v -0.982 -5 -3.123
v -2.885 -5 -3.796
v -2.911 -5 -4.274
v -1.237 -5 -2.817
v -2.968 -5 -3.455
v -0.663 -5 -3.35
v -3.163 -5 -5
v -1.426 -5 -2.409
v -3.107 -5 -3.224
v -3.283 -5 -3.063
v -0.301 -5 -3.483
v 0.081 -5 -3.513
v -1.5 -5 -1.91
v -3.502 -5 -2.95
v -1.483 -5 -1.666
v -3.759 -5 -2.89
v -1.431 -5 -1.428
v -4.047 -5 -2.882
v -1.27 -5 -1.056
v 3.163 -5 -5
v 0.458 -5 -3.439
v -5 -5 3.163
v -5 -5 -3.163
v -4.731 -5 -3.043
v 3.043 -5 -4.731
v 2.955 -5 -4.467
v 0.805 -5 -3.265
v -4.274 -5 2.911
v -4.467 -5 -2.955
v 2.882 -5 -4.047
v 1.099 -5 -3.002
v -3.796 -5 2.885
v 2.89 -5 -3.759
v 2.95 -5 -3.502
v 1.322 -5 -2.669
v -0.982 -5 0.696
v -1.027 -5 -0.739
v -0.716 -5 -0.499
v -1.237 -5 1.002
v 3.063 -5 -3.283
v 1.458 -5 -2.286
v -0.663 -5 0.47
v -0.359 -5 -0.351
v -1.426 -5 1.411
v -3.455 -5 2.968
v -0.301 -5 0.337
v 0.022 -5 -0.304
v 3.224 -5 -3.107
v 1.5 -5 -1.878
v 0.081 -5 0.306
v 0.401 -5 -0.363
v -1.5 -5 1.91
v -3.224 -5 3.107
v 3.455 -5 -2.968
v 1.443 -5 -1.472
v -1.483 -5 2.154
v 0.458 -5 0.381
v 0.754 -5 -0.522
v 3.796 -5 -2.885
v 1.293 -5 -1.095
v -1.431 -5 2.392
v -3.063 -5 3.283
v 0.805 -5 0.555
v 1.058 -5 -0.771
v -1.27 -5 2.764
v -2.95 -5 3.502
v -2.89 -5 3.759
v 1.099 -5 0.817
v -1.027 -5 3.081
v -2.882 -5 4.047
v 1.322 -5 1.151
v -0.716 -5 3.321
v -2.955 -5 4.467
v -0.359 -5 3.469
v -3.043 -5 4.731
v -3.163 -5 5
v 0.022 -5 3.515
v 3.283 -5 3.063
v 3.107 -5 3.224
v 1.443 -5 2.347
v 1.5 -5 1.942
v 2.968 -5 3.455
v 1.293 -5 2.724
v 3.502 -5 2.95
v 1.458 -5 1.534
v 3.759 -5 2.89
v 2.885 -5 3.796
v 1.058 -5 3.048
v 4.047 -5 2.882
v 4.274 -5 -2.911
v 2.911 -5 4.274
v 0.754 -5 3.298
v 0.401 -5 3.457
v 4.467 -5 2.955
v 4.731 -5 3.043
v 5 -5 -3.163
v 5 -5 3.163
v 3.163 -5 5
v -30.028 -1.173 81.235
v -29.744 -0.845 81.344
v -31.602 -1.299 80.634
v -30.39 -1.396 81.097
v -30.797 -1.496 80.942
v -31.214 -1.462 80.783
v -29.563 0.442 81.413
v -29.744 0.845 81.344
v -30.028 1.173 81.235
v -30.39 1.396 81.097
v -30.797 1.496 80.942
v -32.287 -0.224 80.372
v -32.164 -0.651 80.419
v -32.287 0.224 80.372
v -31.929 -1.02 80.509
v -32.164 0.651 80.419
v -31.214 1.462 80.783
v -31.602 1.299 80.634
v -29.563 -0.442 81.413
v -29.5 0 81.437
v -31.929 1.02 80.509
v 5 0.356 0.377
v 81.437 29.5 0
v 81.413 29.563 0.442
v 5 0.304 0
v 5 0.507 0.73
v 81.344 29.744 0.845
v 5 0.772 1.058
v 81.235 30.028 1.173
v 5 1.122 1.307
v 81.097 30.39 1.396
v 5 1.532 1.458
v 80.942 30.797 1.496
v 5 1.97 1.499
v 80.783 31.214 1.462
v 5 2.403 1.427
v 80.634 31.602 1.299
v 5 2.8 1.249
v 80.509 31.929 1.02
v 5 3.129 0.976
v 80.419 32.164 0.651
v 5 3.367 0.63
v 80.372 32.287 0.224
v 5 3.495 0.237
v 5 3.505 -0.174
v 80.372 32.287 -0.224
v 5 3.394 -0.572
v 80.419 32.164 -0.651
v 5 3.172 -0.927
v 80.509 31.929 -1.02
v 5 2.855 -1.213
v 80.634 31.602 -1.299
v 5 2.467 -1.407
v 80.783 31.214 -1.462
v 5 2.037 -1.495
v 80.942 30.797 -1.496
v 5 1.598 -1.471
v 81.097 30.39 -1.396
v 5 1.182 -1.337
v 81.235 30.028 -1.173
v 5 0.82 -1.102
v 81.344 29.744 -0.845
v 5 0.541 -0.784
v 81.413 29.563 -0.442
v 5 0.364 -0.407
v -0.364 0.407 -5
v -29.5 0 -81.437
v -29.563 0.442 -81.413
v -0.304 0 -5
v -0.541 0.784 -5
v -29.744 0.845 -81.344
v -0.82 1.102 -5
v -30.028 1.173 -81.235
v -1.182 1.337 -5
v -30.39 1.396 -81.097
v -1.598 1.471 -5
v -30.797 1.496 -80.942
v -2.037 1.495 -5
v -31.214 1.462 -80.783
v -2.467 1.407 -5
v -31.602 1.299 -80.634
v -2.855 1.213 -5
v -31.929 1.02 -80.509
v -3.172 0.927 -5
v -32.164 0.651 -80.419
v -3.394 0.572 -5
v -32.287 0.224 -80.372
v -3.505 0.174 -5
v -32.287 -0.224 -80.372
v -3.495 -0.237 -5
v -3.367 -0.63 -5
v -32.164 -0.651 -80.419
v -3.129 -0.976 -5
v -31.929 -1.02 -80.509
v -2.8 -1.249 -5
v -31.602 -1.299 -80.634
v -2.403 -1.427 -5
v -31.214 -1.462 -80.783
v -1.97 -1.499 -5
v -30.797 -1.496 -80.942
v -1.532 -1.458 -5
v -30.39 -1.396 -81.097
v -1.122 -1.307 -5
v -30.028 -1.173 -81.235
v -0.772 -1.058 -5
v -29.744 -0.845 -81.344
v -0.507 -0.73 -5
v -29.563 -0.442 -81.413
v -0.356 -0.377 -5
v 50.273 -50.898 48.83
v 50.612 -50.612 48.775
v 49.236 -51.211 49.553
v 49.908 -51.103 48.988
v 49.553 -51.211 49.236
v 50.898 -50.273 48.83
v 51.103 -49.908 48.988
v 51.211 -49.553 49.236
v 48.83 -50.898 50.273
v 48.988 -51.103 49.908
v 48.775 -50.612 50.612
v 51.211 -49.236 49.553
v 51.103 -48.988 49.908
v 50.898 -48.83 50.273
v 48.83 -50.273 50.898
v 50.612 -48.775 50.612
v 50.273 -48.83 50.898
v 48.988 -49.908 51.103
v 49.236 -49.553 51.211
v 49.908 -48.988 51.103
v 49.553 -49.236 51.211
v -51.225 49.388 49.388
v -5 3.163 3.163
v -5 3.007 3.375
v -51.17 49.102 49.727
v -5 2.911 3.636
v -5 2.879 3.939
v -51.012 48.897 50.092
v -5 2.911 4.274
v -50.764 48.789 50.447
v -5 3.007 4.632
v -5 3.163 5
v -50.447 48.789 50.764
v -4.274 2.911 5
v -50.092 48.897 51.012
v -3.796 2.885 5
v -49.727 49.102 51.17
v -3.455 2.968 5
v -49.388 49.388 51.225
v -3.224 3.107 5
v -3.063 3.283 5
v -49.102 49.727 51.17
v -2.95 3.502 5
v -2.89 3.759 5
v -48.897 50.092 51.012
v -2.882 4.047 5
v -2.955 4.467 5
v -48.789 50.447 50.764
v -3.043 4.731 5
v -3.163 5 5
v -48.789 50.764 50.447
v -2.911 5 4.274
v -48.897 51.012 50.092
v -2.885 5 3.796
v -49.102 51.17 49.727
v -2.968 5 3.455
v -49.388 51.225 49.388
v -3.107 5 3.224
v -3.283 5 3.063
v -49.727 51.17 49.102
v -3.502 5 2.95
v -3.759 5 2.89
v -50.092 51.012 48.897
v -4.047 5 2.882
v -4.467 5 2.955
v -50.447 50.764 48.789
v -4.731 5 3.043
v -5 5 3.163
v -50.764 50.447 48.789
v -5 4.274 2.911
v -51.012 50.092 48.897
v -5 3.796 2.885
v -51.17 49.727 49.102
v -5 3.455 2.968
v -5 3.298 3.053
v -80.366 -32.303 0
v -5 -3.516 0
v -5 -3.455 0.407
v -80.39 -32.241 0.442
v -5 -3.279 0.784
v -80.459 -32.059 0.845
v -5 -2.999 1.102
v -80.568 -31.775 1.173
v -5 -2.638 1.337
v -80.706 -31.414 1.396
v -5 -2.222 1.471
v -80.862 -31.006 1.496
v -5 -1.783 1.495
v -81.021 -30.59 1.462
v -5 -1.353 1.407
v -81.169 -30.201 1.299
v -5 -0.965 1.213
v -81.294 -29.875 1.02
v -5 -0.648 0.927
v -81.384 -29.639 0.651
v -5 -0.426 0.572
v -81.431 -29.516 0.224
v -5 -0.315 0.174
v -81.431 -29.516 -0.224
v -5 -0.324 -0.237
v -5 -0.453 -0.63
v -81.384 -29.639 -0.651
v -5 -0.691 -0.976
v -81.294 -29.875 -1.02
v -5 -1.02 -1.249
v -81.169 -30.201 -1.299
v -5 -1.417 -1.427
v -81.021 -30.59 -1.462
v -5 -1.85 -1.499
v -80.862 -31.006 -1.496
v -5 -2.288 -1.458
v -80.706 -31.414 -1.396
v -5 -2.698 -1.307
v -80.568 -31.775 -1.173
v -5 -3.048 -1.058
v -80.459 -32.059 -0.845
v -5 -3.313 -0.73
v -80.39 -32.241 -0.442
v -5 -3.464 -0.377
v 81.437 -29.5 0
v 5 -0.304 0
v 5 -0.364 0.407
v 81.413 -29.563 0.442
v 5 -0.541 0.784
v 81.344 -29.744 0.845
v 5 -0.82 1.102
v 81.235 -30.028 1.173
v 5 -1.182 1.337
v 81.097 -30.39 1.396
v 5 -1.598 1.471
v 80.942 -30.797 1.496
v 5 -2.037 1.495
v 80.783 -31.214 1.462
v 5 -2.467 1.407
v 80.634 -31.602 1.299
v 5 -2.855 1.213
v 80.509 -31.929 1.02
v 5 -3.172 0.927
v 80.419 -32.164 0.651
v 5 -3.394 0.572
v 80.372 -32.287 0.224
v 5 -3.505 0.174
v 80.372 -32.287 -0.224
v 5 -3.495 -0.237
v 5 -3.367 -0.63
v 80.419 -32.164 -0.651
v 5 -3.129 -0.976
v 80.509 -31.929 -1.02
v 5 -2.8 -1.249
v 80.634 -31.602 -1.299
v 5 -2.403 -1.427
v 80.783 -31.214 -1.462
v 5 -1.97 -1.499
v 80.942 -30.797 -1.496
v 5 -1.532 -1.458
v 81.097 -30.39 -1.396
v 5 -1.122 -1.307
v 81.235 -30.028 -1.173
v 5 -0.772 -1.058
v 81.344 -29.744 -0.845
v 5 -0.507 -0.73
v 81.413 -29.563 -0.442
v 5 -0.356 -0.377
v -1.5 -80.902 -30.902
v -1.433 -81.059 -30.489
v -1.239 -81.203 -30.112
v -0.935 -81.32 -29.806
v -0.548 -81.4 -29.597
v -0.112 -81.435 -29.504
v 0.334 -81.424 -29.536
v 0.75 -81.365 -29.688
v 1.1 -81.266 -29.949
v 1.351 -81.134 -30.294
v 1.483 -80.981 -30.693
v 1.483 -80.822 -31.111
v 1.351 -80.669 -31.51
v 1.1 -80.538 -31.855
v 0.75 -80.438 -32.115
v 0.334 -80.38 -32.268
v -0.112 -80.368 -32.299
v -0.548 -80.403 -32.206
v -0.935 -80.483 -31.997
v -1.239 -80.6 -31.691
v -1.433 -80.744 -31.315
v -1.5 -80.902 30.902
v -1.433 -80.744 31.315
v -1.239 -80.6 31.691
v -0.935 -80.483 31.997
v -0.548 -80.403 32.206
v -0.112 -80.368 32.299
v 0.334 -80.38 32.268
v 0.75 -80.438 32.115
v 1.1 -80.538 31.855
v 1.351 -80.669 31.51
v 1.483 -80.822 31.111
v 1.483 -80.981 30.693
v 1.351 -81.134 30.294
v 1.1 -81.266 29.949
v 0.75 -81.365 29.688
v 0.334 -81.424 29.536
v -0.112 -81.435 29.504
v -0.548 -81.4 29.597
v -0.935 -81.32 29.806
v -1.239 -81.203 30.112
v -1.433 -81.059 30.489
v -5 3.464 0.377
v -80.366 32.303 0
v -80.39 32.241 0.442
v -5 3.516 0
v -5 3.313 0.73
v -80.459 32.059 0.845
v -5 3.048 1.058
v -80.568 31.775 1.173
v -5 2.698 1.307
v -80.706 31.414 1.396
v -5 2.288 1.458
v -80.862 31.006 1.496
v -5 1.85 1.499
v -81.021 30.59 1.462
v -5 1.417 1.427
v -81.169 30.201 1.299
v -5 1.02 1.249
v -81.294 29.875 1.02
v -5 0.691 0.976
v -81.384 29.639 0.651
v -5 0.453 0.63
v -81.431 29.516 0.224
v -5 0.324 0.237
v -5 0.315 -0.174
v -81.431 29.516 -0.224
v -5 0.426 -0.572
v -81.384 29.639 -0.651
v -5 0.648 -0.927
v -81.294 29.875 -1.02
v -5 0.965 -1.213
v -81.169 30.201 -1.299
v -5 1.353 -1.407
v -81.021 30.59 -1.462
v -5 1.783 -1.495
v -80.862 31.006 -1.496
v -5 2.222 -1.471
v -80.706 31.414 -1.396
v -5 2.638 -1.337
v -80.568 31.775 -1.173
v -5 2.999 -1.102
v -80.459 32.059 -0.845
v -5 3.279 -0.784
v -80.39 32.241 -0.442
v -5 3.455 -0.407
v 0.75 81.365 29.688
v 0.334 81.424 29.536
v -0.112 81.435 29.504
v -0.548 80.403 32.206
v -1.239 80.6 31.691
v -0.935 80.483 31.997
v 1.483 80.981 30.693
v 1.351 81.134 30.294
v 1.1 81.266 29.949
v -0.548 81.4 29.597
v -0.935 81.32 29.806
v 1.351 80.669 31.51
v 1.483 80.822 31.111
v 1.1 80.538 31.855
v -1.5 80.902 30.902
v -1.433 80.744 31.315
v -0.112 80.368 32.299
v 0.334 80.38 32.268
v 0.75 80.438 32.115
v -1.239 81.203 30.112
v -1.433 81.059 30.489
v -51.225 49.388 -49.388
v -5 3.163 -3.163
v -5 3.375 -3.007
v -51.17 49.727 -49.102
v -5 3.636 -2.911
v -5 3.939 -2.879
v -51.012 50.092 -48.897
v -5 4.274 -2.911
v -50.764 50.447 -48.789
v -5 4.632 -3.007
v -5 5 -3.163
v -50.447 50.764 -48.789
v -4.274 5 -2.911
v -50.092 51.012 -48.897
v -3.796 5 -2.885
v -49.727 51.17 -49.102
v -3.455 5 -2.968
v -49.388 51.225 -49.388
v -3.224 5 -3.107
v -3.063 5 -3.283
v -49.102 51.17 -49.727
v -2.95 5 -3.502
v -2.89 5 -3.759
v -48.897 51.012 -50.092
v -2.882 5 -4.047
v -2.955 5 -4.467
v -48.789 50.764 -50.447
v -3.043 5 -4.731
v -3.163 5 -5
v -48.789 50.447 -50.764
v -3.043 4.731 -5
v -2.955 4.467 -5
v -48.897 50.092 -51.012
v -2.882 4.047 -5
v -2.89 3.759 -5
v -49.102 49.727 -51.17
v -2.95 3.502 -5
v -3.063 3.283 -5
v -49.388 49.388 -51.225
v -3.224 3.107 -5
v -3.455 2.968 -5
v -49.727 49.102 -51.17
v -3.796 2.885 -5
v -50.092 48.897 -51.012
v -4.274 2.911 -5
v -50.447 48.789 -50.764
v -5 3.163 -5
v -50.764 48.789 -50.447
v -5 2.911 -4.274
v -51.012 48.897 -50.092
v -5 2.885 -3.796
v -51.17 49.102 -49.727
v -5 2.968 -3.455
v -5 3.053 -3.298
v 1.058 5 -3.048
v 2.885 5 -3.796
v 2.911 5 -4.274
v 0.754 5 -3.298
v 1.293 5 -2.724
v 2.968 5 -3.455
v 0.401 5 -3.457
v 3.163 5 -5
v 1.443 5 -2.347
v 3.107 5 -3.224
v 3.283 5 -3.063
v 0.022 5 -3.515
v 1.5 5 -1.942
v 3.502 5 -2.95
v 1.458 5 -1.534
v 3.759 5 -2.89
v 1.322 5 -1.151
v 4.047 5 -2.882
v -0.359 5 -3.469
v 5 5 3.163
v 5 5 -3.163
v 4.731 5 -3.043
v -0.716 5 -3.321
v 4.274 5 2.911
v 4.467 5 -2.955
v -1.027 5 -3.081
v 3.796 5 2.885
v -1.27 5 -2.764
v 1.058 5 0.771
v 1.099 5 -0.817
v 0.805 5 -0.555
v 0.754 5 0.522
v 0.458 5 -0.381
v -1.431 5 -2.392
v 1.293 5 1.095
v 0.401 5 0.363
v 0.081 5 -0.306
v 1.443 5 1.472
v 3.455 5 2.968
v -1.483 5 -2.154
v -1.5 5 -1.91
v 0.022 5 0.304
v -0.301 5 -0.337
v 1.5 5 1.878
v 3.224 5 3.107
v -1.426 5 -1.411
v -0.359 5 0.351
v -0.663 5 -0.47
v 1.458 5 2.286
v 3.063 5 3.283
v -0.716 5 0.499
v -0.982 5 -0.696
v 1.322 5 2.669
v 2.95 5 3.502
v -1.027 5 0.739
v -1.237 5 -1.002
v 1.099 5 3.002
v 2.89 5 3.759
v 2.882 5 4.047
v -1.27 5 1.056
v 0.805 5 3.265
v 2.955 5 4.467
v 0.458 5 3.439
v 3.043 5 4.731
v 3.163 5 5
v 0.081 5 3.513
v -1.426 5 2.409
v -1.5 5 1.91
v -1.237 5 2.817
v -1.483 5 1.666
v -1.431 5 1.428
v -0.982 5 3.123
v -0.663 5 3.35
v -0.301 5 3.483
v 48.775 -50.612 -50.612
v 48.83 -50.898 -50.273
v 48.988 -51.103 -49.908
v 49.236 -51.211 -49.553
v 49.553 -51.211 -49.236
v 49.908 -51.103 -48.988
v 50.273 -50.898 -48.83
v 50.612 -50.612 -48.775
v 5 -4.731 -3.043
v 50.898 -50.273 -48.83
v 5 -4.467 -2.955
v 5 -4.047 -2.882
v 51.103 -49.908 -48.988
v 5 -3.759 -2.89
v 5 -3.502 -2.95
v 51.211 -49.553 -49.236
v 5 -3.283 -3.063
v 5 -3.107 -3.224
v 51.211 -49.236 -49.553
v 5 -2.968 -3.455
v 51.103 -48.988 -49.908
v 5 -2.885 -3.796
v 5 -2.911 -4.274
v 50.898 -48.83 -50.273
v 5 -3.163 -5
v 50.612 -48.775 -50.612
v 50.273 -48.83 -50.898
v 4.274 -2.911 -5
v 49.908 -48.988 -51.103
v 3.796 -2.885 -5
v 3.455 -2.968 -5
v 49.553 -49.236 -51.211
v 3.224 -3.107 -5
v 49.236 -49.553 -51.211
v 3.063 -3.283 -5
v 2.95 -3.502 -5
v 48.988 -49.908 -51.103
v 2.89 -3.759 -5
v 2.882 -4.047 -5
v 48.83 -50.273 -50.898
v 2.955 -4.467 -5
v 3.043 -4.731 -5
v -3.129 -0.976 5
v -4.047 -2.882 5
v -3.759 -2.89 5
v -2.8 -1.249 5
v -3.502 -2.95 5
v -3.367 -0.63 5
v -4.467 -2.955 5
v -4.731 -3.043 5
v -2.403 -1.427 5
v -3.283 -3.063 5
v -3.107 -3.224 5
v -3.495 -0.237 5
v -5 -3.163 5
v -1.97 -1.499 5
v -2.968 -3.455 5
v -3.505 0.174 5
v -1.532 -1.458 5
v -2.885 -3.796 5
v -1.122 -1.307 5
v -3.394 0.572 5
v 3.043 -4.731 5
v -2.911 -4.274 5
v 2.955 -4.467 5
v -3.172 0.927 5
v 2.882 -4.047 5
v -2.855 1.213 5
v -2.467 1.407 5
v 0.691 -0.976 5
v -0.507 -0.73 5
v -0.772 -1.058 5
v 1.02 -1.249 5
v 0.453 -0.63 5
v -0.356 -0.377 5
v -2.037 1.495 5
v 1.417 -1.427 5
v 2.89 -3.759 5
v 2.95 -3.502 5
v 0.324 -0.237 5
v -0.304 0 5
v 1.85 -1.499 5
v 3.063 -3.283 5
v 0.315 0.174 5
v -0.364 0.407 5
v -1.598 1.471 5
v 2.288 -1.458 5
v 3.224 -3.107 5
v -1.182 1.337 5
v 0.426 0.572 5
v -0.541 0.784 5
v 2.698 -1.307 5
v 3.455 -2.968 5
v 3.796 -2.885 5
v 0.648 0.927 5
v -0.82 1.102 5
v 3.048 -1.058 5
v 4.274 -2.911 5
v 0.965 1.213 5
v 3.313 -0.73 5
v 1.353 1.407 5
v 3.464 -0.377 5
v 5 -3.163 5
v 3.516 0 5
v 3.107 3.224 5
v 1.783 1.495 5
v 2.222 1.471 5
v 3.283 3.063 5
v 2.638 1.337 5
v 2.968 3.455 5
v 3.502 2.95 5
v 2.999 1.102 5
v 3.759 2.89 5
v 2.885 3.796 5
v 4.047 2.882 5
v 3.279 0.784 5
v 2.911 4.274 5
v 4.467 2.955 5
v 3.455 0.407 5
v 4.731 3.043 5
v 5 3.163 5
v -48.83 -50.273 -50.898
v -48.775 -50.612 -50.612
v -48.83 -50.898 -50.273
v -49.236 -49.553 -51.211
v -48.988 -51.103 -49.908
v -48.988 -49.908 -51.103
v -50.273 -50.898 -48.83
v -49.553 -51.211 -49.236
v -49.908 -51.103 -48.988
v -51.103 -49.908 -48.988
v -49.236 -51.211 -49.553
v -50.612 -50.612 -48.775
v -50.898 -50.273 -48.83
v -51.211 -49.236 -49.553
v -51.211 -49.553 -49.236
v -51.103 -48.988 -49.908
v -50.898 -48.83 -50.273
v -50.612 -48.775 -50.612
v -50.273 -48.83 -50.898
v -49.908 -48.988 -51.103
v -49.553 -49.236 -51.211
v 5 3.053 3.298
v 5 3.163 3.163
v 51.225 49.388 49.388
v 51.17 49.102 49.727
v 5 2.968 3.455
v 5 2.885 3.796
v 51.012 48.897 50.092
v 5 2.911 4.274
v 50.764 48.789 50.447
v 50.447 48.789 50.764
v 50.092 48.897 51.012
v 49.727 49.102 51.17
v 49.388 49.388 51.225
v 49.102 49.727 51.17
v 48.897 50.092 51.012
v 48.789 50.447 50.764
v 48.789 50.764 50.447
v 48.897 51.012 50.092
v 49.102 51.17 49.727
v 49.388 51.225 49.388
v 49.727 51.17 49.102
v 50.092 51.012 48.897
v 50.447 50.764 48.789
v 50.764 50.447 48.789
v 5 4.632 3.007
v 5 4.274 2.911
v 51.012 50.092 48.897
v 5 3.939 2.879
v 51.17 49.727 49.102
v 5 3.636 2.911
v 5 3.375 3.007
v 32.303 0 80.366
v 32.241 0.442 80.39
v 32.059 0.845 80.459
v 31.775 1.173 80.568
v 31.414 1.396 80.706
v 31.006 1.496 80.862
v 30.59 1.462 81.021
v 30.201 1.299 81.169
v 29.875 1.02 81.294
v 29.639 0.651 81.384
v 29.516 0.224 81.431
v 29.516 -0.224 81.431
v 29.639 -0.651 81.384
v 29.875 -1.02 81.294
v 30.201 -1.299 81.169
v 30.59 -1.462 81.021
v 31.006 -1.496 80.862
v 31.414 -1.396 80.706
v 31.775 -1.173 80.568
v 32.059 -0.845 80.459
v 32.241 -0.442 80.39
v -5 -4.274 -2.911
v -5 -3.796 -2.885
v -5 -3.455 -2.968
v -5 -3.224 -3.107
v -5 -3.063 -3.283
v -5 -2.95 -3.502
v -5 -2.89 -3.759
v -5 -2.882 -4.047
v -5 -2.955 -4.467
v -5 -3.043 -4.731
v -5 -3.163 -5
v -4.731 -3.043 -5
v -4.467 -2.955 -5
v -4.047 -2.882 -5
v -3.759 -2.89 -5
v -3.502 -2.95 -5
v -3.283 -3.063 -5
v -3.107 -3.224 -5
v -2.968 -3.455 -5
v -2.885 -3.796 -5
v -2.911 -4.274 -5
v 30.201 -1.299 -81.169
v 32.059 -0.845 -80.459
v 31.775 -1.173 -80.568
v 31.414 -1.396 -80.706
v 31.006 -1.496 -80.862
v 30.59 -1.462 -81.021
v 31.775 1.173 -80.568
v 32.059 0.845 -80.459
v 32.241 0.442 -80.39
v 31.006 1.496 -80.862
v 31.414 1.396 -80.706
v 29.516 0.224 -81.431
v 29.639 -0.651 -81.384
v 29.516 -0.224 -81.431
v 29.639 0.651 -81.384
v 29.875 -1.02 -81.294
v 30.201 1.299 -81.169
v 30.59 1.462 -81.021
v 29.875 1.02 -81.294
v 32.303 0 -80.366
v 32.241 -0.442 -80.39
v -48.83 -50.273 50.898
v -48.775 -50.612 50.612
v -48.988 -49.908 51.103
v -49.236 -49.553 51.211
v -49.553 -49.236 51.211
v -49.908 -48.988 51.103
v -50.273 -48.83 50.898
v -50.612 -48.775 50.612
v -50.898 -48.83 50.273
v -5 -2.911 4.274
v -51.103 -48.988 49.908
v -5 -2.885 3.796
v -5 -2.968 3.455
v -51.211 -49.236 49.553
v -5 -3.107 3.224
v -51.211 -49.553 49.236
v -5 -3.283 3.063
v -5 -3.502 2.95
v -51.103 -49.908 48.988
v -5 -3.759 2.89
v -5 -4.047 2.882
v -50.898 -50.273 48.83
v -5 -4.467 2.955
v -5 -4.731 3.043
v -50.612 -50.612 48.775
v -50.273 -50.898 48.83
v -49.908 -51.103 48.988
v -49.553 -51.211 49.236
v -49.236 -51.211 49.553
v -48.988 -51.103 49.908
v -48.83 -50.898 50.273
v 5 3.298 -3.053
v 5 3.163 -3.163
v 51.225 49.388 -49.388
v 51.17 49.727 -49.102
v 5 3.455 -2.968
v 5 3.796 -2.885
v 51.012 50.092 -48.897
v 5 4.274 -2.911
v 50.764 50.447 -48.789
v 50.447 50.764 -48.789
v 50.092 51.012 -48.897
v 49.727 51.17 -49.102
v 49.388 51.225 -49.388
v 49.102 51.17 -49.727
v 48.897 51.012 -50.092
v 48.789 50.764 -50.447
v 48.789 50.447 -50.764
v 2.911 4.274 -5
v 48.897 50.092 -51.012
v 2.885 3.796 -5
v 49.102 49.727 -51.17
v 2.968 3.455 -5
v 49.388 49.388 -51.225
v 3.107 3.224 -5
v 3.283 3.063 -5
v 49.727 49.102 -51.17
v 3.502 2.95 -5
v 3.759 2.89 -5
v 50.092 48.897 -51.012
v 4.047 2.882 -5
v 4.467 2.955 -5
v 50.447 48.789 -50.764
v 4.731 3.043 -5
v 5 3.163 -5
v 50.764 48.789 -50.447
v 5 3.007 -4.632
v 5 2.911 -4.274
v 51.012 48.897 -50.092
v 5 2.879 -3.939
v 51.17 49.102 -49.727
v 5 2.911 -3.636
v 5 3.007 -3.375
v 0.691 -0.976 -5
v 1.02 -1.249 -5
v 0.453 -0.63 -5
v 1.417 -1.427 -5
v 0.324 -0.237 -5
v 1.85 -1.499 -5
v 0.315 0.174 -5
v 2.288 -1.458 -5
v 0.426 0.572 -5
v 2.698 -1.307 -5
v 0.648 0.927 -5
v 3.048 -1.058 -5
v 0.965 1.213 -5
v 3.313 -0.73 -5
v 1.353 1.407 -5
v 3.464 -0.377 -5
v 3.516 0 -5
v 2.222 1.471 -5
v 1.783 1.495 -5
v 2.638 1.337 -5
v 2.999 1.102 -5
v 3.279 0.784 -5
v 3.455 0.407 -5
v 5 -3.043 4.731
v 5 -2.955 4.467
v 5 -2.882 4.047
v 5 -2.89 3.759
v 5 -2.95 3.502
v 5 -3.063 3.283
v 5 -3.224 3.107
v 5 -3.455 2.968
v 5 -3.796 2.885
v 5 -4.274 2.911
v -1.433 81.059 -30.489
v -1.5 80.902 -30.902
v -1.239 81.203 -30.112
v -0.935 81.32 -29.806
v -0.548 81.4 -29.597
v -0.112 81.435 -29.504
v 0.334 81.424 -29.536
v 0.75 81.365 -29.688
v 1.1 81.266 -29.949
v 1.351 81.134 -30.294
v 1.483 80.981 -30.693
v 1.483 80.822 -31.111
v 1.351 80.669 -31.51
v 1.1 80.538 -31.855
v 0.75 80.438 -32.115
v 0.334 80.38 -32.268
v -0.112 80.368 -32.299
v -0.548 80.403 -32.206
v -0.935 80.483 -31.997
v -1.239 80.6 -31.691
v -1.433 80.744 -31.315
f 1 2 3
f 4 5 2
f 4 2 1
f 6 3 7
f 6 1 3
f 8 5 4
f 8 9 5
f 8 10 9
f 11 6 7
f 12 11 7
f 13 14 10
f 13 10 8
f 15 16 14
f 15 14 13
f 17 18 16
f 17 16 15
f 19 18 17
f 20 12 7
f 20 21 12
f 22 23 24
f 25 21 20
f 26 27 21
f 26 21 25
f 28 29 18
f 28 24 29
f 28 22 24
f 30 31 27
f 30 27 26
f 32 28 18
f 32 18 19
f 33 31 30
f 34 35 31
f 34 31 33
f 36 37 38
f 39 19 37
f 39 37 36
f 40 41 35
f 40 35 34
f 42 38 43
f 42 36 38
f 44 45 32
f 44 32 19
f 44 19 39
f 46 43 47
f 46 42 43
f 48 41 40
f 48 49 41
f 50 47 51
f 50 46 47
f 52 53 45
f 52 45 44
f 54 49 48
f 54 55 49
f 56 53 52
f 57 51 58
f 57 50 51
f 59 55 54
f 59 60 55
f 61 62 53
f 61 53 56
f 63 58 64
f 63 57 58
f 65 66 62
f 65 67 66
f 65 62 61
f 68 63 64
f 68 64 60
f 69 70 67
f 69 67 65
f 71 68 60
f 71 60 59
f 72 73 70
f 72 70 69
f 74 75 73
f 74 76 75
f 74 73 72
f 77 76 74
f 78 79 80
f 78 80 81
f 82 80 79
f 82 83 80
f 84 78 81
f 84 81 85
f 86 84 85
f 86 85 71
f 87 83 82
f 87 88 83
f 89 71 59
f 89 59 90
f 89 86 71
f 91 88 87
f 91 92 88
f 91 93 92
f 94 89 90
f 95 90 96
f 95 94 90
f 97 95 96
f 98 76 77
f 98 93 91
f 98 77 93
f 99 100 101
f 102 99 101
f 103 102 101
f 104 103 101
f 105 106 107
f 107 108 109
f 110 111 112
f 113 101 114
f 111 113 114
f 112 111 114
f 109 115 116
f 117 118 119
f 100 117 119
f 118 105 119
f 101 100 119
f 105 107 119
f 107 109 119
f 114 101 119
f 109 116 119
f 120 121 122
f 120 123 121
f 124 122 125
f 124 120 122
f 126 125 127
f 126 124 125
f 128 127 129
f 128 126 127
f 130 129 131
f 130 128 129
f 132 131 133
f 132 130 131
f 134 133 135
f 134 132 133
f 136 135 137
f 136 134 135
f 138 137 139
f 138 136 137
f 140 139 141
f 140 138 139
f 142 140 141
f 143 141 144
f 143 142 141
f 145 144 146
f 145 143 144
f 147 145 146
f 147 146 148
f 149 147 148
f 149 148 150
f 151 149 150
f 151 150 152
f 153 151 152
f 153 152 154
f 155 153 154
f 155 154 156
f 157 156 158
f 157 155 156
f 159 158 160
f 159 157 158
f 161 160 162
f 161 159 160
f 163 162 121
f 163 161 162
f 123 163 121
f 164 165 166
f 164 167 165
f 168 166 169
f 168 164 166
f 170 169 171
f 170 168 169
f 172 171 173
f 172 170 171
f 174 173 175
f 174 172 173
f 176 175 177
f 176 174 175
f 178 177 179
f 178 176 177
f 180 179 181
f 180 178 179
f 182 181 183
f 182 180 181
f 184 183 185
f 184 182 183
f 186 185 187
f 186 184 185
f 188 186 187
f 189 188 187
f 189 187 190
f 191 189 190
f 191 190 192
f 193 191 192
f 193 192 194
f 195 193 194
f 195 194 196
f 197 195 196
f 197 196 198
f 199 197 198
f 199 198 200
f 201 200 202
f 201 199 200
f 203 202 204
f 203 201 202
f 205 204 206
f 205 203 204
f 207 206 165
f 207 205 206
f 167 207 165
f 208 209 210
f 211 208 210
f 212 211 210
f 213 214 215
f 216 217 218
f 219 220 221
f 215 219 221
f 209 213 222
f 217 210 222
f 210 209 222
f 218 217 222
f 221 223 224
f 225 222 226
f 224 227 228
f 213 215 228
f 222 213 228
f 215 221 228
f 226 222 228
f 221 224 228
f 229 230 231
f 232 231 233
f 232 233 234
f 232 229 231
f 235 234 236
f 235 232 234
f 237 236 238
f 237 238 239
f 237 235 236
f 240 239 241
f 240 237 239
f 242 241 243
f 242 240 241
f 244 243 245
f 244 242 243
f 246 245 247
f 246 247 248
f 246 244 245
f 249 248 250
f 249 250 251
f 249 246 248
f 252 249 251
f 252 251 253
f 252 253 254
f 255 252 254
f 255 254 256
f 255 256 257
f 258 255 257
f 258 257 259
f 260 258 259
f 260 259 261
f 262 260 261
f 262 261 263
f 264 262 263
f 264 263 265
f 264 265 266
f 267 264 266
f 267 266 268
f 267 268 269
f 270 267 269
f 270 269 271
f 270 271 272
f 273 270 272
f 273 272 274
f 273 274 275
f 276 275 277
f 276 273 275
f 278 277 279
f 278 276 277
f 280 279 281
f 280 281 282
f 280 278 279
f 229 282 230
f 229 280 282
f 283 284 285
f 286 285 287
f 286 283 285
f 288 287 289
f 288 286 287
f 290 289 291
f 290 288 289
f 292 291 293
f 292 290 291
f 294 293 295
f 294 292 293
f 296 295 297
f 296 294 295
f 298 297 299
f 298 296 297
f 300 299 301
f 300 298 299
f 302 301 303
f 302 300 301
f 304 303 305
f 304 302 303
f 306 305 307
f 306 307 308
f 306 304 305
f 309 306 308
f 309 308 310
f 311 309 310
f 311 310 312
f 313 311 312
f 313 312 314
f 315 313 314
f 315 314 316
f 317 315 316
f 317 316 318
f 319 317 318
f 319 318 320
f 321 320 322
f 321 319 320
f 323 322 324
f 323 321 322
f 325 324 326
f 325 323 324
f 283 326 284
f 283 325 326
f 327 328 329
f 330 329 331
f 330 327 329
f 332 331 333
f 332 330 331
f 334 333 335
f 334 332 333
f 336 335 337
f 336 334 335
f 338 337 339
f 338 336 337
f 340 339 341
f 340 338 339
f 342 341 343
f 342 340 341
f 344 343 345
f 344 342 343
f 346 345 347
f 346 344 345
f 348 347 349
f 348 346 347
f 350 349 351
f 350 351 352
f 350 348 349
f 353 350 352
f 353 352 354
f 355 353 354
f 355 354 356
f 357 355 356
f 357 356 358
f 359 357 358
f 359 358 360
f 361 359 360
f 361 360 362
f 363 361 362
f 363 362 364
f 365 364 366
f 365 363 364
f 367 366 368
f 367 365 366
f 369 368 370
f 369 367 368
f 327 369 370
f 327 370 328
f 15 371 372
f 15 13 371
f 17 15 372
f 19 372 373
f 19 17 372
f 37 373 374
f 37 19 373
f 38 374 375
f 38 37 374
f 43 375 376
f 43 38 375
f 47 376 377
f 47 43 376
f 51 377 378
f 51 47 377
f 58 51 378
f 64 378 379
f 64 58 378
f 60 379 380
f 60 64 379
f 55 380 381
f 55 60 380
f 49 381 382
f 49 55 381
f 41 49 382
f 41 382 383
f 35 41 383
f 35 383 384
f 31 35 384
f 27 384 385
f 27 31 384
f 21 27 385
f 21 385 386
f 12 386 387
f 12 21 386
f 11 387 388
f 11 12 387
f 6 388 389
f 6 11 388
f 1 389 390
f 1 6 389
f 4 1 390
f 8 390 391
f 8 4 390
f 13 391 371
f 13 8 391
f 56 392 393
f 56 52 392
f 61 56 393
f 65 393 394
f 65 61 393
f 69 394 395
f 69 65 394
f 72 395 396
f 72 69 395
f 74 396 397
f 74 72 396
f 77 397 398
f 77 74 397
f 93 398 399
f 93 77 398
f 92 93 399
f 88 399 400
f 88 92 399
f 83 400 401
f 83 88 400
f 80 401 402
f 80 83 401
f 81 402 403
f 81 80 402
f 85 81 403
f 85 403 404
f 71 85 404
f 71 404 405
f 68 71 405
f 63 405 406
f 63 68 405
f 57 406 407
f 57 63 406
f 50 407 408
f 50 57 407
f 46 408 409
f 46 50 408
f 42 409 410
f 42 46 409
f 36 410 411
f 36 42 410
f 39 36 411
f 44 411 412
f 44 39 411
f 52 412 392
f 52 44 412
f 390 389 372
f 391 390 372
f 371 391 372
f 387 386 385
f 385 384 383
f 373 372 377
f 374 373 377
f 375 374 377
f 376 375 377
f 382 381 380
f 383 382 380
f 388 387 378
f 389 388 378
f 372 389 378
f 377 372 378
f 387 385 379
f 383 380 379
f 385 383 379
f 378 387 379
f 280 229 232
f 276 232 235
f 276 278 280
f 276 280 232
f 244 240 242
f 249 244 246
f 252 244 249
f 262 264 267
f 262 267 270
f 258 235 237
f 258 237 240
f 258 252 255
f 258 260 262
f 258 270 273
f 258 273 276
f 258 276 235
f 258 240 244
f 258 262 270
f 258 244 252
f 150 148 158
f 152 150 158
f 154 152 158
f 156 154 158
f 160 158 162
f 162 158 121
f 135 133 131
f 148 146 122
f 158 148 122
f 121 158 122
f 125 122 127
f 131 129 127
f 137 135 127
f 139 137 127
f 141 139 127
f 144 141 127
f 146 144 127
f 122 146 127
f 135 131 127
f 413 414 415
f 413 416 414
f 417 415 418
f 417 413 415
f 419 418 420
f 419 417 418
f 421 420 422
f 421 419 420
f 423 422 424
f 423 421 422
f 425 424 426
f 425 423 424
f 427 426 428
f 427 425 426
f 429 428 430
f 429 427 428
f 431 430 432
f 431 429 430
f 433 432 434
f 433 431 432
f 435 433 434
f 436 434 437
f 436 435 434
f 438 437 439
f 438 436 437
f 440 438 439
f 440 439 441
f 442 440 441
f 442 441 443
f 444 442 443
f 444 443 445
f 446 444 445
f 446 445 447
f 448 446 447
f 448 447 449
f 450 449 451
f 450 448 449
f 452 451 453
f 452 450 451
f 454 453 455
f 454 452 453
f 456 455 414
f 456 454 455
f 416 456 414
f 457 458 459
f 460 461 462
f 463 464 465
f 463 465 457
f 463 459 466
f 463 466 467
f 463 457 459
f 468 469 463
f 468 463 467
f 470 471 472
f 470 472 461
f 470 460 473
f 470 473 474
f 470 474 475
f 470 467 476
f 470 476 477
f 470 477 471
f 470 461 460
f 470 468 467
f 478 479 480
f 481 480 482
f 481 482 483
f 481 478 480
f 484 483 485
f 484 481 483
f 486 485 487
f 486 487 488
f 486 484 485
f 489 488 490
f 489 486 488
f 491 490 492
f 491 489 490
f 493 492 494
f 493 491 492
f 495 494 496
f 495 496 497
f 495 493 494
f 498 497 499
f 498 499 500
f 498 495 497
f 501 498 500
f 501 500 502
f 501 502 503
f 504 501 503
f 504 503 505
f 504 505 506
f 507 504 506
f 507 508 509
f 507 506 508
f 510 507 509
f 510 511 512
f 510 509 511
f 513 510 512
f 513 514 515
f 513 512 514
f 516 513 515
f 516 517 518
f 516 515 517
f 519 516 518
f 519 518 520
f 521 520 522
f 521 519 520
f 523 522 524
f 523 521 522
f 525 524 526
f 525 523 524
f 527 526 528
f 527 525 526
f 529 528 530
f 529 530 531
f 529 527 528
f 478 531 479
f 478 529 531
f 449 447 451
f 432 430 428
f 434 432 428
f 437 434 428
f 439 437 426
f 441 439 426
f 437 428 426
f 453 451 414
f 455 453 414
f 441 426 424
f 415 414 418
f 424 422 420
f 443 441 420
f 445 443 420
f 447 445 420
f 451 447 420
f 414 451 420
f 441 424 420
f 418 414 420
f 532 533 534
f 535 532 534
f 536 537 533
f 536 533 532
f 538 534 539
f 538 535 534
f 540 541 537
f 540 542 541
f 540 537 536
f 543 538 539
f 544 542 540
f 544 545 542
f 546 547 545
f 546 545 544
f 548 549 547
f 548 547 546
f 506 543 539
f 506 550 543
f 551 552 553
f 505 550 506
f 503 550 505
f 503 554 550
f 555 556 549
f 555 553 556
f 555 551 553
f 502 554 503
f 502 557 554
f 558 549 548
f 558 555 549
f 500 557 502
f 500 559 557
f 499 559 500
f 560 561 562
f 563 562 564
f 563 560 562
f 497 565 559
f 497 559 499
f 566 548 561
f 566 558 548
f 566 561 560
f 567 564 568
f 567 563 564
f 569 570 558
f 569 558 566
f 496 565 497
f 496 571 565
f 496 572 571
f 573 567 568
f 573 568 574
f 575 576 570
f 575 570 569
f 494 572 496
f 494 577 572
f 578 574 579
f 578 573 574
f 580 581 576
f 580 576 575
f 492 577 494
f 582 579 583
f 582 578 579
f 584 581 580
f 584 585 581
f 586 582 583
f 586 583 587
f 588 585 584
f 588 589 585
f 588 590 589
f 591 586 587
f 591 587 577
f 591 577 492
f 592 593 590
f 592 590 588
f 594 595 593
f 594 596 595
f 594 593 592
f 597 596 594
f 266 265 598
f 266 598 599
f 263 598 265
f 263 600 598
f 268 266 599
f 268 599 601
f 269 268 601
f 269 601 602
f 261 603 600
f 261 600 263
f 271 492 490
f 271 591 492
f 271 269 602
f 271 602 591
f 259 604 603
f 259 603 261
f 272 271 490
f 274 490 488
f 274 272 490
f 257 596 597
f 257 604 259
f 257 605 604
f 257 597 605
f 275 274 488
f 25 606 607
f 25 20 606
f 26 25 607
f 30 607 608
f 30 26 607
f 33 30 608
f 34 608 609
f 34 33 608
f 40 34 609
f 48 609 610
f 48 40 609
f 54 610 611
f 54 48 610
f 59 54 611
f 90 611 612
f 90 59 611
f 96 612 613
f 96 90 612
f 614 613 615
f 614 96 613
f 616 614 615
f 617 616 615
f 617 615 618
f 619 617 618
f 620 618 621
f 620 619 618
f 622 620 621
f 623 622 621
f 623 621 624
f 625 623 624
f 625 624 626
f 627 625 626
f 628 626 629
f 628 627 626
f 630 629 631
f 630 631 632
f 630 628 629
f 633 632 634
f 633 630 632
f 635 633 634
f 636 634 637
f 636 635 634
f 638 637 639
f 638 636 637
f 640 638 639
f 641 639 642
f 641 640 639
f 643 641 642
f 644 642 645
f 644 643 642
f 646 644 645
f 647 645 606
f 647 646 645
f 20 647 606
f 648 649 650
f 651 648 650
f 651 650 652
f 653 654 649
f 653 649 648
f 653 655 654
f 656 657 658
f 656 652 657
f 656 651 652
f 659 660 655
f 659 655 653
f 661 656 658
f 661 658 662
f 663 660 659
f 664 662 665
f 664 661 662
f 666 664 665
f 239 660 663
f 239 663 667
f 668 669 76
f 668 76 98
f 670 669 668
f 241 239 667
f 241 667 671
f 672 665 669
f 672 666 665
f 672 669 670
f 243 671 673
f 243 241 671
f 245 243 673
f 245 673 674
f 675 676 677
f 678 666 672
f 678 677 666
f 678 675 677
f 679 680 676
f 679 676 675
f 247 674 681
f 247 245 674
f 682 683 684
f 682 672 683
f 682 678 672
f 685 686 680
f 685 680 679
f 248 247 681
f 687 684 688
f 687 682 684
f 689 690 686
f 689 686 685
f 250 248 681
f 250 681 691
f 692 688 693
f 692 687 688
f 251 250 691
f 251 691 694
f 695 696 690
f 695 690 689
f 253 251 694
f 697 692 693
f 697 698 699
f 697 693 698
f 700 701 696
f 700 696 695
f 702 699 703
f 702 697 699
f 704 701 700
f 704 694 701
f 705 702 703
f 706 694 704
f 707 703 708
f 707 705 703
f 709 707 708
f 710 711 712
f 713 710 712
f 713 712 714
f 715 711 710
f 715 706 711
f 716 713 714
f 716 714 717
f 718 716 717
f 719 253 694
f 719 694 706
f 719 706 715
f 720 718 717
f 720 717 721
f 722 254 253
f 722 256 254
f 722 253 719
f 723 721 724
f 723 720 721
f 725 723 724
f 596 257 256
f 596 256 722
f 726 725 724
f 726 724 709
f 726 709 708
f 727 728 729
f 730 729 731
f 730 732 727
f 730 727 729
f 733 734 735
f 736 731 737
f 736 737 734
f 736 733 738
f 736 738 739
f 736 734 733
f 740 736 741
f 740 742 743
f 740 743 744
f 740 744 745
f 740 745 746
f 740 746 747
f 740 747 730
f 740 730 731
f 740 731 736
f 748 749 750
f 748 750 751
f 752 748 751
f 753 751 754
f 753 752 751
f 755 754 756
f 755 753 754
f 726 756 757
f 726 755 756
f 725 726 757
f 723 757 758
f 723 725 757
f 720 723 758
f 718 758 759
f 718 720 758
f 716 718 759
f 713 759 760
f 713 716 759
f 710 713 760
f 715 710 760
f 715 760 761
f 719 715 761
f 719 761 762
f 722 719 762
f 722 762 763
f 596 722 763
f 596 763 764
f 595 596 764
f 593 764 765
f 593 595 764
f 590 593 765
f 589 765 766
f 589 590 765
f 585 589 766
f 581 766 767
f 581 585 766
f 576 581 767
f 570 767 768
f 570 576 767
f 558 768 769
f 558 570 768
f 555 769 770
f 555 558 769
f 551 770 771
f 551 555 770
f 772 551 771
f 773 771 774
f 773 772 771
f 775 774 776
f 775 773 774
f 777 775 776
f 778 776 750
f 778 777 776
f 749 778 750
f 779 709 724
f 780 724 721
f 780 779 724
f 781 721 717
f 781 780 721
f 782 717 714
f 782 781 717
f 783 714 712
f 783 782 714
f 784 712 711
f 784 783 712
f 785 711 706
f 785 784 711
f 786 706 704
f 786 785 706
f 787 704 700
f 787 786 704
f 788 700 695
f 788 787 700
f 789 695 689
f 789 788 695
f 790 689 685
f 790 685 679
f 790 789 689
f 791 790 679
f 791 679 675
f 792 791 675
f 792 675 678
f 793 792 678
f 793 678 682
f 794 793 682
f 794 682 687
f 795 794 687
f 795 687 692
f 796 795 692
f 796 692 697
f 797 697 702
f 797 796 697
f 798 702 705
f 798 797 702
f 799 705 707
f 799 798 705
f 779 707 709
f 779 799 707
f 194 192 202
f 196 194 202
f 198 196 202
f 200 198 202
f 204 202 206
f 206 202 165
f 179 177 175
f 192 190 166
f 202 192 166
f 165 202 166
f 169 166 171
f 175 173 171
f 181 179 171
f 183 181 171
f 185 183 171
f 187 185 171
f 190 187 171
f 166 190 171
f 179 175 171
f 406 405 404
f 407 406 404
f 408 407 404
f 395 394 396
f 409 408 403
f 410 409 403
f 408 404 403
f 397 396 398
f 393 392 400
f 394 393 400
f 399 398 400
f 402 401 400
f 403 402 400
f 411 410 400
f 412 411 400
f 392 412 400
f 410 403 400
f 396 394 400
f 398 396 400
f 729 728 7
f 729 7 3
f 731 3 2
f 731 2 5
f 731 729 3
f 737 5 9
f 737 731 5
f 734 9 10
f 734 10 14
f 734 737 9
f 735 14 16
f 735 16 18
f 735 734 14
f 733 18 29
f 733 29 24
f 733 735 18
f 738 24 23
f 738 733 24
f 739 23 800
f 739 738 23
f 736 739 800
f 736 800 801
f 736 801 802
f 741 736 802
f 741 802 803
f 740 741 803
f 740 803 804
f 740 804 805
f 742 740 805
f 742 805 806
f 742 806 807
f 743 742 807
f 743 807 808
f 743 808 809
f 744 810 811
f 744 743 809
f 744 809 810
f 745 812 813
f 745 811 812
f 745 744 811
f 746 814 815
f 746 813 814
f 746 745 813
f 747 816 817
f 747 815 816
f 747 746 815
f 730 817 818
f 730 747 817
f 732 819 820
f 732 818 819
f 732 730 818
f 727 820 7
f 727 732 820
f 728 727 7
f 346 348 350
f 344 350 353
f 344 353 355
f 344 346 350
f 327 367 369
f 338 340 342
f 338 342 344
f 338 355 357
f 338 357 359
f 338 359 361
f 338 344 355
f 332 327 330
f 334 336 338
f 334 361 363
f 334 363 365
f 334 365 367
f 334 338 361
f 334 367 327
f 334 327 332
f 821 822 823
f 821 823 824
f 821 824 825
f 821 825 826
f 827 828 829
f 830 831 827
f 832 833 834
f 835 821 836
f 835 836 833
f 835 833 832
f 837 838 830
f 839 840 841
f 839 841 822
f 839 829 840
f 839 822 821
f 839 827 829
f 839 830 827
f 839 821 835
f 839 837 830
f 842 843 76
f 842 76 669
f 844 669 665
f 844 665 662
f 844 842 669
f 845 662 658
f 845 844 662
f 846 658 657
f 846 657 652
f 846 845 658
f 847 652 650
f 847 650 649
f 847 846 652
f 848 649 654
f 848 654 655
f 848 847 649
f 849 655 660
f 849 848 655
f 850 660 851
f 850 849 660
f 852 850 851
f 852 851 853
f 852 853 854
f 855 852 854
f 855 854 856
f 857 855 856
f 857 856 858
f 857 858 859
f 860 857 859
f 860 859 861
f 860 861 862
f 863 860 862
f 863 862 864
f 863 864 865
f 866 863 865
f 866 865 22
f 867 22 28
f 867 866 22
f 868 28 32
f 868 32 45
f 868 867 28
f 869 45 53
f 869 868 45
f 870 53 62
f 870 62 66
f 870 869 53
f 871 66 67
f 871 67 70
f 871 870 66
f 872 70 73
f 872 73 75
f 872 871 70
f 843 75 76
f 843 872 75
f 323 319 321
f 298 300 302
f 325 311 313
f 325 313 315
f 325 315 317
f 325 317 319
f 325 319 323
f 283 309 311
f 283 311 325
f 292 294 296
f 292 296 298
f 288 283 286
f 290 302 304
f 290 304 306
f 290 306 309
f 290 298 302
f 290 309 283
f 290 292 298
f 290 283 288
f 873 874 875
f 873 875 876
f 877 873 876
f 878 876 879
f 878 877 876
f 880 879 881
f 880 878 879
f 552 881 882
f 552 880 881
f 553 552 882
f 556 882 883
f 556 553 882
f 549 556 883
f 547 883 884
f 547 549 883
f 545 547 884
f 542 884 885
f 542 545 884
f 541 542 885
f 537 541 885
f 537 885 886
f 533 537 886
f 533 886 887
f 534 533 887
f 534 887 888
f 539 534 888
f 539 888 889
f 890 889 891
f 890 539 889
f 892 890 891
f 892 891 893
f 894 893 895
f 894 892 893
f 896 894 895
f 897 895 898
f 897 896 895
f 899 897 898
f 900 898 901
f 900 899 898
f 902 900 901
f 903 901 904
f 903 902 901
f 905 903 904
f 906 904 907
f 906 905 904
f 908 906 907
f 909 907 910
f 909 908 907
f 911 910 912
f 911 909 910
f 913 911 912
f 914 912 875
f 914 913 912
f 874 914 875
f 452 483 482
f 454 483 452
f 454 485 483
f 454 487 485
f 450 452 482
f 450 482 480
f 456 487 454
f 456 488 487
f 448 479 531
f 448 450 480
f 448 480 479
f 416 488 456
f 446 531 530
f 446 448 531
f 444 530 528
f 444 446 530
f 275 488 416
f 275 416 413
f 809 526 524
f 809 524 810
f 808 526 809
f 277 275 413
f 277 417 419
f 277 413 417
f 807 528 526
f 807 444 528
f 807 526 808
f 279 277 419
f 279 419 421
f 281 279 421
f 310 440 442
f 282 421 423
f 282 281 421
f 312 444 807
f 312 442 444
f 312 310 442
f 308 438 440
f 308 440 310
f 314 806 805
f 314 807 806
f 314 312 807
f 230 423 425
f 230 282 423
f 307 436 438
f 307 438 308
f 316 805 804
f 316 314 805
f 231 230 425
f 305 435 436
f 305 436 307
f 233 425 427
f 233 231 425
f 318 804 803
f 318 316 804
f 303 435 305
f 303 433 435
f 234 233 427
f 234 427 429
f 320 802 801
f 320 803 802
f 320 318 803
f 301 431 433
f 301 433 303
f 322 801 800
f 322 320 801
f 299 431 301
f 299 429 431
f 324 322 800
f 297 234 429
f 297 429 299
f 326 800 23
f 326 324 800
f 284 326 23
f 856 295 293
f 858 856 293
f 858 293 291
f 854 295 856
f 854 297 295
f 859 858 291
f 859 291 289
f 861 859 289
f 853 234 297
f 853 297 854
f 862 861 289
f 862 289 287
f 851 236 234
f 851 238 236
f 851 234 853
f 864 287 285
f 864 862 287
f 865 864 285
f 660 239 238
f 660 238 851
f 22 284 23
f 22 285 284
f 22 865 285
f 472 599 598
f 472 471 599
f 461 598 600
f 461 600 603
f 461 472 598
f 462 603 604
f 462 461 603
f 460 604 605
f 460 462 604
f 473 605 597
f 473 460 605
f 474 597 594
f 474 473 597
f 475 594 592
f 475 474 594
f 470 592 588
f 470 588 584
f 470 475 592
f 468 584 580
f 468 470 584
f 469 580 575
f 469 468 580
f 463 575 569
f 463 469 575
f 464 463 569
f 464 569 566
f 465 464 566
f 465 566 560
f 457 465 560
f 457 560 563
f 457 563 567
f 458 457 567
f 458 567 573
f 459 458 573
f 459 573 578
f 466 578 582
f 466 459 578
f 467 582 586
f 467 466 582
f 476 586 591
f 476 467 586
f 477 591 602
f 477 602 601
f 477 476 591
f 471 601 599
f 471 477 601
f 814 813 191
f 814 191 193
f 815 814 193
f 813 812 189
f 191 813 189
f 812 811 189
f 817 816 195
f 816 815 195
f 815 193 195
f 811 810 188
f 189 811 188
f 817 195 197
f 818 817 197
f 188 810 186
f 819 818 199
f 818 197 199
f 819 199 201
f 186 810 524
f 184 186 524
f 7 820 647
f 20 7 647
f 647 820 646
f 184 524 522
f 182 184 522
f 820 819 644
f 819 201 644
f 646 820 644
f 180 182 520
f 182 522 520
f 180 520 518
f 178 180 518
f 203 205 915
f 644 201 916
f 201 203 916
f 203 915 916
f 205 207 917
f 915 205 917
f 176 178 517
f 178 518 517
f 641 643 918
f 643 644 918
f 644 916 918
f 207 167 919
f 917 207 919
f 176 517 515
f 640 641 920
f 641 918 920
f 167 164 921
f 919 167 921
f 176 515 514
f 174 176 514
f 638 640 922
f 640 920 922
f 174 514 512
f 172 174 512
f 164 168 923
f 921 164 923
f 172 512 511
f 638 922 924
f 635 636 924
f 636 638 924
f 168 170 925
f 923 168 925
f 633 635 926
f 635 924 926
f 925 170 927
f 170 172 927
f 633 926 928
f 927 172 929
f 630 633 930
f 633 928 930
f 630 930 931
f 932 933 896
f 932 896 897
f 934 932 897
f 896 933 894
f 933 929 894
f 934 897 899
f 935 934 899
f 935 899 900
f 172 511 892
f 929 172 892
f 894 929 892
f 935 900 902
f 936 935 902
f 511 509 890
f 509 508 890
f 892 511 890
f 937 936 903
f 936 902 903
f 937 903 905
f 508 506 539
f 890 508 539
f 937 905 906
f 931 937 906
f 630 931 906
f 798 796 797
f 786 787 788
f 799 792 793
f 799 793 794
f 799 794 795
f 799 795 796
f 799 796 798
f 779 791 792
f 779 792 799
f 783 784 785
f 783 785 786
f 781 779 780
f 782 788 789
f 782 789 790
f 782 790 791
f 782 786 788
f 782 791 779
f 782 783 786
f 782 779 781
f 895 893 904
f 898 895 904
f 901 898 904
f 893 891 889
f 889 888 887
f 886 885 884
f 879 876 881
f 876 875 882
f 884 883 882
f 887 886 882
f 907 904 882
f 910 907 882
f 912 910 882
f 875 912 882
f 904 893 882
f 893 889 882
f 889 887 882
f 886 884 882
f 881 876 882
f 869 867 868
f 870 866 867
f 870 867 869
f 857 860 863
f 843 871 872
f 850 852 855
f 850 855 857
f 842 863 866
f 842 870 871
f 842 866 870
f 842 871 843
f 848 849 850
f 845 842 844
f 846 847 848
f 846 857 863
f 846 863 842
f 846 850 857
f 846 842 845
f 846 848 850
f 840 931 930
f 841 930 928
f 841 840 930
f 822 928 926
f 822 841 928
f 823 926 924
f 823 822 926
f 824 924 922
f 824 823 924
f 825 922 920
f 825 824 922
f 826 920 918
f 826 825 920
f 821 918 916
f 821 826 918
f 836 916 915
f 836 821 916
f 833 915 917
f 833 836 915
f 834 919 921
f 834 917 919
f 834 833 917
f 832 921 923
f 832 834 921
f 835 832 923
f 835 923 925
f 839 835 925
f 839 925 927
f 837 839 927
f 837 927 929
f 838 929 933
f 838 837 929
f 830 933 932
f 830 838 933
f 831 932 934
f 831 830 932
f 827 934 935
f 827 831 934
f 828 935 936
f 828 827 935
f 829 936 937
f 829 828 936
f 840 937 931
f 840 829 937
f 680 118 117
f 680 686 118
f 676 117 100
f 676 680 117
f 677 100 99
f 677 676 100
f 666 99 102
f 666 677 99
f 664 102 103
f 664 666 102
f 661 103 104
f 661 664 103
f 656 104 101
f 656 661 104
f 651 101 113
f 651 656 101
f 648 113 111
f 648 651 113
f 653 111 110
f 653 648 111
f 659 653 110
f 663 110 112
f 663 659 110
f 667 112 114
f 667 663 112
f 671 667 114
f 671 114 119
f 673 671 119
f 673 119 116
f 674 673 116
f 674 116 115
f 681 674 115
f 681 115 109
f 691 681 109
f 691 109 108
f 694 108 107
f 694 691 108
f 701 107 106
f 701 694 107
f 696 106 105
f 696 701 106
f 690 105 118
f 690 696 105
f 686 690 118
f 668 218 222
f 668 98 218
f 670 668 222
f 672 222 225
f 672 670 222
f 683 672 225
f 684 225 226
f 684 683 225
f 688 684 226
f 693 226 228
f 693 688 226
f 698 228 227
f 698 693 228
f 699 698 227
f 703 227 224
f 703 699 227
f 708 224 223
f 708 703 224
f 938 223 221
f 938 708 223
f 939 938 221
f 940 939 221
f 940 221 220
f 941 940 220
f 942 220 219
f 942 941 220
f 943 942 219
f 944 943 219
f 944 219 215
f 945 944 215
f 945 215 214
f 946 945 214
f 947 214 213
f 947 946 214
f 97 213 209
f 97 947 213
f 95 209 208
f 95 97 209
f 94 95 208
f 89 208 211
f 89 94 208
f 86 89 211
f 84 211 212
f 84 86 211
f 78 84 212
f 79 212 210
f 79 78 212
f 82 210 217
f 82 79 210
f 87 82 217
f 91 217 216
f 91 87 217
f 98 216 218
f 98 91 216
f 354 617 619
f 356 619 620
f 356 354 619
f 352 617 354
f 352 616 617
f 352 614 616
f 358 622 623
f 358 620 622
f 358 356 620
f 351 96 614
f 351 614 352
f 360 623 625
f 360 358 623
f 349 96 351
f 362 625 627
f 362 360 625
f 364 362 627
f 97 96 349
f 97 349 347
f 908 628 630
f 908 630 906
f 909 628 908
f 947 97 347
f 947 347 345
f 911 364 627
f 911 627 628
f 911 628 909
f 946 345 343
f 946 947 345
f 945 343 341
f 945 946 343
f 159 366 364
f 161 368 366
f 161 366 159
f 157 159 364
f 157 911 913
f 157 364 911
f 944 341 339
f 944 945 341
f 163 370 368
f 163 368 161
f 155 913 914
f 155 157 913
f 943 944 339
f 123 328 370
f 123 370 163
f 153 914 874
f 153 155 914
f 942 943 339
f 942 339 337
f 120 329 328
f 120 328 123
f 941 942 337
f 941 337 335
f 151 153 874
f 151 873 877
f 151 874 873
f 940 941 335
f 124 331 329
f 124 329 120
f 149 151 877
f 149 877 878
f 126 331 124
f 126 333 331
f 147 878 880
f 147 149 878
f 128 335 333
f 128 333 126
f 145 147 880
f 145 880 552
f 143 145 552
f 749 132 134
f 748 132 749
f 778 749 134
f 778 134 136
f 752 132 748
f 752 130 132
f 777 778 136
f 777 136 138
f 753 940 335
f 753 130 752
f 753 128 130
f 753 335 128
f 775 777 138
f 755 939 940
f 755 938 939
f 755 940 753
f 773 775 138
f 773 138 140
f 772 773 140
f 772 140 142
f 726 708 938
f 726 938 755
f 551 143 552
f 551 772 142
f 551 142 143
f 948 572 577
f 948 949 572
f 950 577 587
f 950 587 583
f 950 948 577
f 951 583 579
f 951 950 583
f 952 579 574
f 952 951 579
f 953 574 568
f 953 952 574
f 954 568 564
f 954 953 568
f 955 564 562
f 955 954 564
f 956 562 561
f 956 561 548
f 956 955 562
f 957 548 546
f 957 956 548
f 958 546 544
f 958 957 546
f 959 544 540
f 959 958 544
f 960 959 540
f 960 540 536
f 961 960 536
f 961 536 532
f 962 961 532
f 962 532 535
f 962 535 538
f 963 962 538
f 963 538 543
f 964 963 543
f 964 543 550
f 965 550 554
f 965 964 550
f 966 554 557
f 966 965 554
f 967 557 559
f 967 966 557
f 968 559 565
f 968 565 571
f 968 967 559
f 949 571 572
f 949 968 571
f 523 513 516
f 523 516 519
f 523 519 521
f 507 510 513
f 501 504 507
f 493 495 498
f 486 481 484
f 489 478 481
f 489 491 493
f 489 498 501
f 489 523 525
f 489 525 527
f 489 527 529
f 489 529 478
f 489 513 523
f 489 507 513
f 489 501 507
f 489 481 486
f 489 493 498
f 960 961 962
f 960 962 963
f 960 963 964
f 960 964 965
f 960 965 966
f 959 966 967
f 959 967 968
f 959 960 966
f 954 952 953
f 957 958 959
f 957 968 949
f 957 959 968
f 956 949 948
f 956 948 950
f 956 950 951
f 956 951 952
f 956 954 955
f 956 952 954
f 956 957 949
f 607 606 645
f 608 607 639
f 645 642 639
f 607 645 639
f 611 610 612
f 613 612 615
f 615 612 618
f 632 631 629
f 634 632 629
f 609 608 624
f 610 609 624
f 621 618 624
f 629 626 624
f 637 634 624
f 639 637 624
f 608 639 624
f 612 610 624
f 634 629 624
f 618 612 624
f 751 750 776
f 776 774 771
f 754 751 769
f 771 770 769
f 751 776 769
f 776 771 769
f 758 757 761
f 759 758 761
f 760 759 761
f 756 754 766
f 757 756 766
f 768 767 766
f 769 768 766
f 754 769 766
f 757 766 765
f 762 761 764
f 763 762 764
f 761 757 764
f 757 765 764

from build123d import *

# Parameters (mm, degrees)
F1_DEPTH = 5
F9_R     = 1.5
F12_R    = 1.5
F15_R    = 1.5
F18_R    = 1.5
F21_R    = 1.5
F24_R    = 1.5
F28_R    = 1.5
F32_R    = 1.5
F31_R    = 1.5
F36_R    = 1.5


with BuildPart() as f1:
    # F0 (on Top) → F1 (new body, symmetric)
    with BuildSketch(Plane.XY):
        Polygon((-5, -5), (5, -5), (5, -1.9098300548), (0, 0), (-5, -1.9098300548), align=None)
        Polygon((0, 0), (5, -1.9098300548), (5, 1.9098300548), align=None)
        Polygon((-5, 1.9098300548), (-5, -1.9098300548), (0, 0), align=None)
        Polygon((0, 0), (5, 1.9098300548), (5, 5), (-5, 5), (-5, 1.9098300548), align=None)
    extrude(amount=F1_DEPTH, both=True)

    # F10: sweep along a path in F3
    with BuildLine(Plane(origin=(0, 0, 0), x_dir=(-0.7071067812, 0.7071067812, 0), z_dir=(0.7071067812, 0.7071067812, 0))) as f10_path:
        Line((-70.710678, 50), (70.710678, -50))
    # F9 (on line) → F10 (sweep)
    with BuildSketch(Plane(origin=(49.9999999161, -49.9999999161, 50), x_dir=(-0.8164965812, -0.4082482899, 0.4082482906), z_dir=(-0.5773502689, 0.5773502689, -0.5773502698))):
        Circle(F9_R)
    sweep(path=f10_path.line)

    # F13: sweep along a path in F3
    with BuildLine(Plane(origin=(0, 0, 0), x_dir=(-0.7071067812, 0.7071067812, 0), z_dir=(0.7071067812, 0.7071067812, 0))) as f13_path:
        Line((-70.710678, -50), (70.710678, 50))
    # F12 (on line) → F13 (sweep)
    with BuildSketch(Plane(origin=(49.9999999161, -49.9999999161, -50), x_dir=(-0.8164965812, -0.4082482899, -0.4082482906), z_dir=(-0.5773502689, 0.5773502689, 0.5773502698))):
        Circle(F12_R)
    sweep(path=f13_path.line)

    # F16: sweep along a path in F5
    with BuildLine(Plane(origin=(0, 0, 0), x_dir=(0.7071067812, 0.7071067812, 0), z_dir=(0.7071067812, -0.7071067812, 0))) as f16_path:
        Line((70.710678, -50), (-70.710678, 50))
    # F15 (on line) → F16 (sweep)
    with BuildSketch(Plane(origin=(-49.9999999161, -49.9999999161, 50), x_dir=(0.8164965812, -0.4082482899, 0.4082482906), z_dir=(-0.5773502689, -0.5773502689, 0.5773502698))):
        Circle(F15_R)
    sweep(path=f16_path.line)

    # F19: sweep along a path in F5
    with BuildLine(Plane(origin=(0, 0, 0), x_dir=(0.7071067812, 0.7071067812, 0), z_dir=(0.7071067812, -0.7071067812, 0))) as f19_path:
        Line((70.710678, 50), (-70.710678, -50))
    # F18 (on line) → F19 (sweep)
    with BuildSketch(Plane(origin=(-49.9999999161, -49.9999999161, -50), x_dir=(0.8164965812, -0.4082482899, -0.4082482906), z_dir=(-0.5773502689, -0.5773502689, -0.5773502698))):
        Circle(F18_R)
    sweep(path=f19_path.line)

    # F22: sweep along a path in F7
    with BuildLine(Plane.YZ) as f22_path:
        Line((-80.9016994, -30.9016994), (80.9016994, 30.9016994))
    # F21 (on line) → F22 (sweep)
    with BuildSketch(Plane(origin=(0, -80.9016994, -30.9016994), x_dir=(-1, 0, 0), z_dir=(0, 0.9341723591, 0.3568220895))):
        Circle(F21_R)
    sweep(path=f22_path.line)

    # F25: sweep along a path in F7
    with BuildLine(Plane.YZ) as f25_path:
        Line((-80.9016994, 30.9016994), (80.9016994, -30.9016994))
    # F24 (on line) → F25 (sweep)
    with BuildSketch(Plane(origin=(0, 80.9016994, -30.9016994), x_dir=(-1, 0, 0), z_dir=(0, 0.9341723591, -0.3568220895))):
        Circle(F24_R)
    sweep(path=f25_path.line)

    # F29: sweep along a path in F0
    with BuildLine(Plane.XY) as f29_path:
        Line((80.9016994, 30.9016994), (-80.9016994, -30.9016994))
    # F28 (on line) → F29 (sweep)
    with BuildSketch(Plane(origin=(80.9016994, 30.9016994, 0), x_dir=(0.3568220895, -0.9341723591, 0), z_dir=(-0.9341723591, -0.3568220895, 0))):
        Circle(F28_R)
    sweep(path=f29_path.line)

    # F33: sweep along a path in F0
    with BuildLine(Plane.XY) as f33_path:
        Line((-80.9016994, 30.9016994), (80.9016994, -30.9016994))
    # F32 (on line) → F33 (sweep)
    with BuildSketch(Plane(origin=(80.9016994, -30.9016994, 0), x_dir=(0.3568220895, 0.9341723591, 0), z_dir=(0.9341723591, -0.3568220895, 0))):
        Circle(F32_R)
    sweep(path=f33_path.line)

    # F34: sweep along a path in F6
    with BuildLine(Plane.XZ) as f34_path:
        Line((-30.9016994, -80.9016994), (30.9016994, 80.9016994))
    # F31 (on line) → F34 (sweep)
    with BuildSketch(Plane(origin=(30.9016994, 0, 80.9016994), x_dir=(0.9341723591, 0, -0.3568220895), z_dir=(0.3568220895, 0, 0.9341723591))):
        Circle(F31_R)
    sweep(path=f34_path.line)

    # F37: sweep along a path in F6
    with BuildLine(Plane.XZ) as f37_path:
        Line((-30.9016994, 80.9016994), (30.9016994, -80.9016994))
    # F36 (on line) → F37 (sweep)
    with BuildSketch(Plane(origin=(-30.9016994, 0, 80.9016994), x_dir=(0.9341723591, 0, 0.3568220895), z_dir=(0.3568220895, 0, -0.9341723591))):
        Circle(F36_R)
    sweep(path=f37_path.line)


solid = f1.part
